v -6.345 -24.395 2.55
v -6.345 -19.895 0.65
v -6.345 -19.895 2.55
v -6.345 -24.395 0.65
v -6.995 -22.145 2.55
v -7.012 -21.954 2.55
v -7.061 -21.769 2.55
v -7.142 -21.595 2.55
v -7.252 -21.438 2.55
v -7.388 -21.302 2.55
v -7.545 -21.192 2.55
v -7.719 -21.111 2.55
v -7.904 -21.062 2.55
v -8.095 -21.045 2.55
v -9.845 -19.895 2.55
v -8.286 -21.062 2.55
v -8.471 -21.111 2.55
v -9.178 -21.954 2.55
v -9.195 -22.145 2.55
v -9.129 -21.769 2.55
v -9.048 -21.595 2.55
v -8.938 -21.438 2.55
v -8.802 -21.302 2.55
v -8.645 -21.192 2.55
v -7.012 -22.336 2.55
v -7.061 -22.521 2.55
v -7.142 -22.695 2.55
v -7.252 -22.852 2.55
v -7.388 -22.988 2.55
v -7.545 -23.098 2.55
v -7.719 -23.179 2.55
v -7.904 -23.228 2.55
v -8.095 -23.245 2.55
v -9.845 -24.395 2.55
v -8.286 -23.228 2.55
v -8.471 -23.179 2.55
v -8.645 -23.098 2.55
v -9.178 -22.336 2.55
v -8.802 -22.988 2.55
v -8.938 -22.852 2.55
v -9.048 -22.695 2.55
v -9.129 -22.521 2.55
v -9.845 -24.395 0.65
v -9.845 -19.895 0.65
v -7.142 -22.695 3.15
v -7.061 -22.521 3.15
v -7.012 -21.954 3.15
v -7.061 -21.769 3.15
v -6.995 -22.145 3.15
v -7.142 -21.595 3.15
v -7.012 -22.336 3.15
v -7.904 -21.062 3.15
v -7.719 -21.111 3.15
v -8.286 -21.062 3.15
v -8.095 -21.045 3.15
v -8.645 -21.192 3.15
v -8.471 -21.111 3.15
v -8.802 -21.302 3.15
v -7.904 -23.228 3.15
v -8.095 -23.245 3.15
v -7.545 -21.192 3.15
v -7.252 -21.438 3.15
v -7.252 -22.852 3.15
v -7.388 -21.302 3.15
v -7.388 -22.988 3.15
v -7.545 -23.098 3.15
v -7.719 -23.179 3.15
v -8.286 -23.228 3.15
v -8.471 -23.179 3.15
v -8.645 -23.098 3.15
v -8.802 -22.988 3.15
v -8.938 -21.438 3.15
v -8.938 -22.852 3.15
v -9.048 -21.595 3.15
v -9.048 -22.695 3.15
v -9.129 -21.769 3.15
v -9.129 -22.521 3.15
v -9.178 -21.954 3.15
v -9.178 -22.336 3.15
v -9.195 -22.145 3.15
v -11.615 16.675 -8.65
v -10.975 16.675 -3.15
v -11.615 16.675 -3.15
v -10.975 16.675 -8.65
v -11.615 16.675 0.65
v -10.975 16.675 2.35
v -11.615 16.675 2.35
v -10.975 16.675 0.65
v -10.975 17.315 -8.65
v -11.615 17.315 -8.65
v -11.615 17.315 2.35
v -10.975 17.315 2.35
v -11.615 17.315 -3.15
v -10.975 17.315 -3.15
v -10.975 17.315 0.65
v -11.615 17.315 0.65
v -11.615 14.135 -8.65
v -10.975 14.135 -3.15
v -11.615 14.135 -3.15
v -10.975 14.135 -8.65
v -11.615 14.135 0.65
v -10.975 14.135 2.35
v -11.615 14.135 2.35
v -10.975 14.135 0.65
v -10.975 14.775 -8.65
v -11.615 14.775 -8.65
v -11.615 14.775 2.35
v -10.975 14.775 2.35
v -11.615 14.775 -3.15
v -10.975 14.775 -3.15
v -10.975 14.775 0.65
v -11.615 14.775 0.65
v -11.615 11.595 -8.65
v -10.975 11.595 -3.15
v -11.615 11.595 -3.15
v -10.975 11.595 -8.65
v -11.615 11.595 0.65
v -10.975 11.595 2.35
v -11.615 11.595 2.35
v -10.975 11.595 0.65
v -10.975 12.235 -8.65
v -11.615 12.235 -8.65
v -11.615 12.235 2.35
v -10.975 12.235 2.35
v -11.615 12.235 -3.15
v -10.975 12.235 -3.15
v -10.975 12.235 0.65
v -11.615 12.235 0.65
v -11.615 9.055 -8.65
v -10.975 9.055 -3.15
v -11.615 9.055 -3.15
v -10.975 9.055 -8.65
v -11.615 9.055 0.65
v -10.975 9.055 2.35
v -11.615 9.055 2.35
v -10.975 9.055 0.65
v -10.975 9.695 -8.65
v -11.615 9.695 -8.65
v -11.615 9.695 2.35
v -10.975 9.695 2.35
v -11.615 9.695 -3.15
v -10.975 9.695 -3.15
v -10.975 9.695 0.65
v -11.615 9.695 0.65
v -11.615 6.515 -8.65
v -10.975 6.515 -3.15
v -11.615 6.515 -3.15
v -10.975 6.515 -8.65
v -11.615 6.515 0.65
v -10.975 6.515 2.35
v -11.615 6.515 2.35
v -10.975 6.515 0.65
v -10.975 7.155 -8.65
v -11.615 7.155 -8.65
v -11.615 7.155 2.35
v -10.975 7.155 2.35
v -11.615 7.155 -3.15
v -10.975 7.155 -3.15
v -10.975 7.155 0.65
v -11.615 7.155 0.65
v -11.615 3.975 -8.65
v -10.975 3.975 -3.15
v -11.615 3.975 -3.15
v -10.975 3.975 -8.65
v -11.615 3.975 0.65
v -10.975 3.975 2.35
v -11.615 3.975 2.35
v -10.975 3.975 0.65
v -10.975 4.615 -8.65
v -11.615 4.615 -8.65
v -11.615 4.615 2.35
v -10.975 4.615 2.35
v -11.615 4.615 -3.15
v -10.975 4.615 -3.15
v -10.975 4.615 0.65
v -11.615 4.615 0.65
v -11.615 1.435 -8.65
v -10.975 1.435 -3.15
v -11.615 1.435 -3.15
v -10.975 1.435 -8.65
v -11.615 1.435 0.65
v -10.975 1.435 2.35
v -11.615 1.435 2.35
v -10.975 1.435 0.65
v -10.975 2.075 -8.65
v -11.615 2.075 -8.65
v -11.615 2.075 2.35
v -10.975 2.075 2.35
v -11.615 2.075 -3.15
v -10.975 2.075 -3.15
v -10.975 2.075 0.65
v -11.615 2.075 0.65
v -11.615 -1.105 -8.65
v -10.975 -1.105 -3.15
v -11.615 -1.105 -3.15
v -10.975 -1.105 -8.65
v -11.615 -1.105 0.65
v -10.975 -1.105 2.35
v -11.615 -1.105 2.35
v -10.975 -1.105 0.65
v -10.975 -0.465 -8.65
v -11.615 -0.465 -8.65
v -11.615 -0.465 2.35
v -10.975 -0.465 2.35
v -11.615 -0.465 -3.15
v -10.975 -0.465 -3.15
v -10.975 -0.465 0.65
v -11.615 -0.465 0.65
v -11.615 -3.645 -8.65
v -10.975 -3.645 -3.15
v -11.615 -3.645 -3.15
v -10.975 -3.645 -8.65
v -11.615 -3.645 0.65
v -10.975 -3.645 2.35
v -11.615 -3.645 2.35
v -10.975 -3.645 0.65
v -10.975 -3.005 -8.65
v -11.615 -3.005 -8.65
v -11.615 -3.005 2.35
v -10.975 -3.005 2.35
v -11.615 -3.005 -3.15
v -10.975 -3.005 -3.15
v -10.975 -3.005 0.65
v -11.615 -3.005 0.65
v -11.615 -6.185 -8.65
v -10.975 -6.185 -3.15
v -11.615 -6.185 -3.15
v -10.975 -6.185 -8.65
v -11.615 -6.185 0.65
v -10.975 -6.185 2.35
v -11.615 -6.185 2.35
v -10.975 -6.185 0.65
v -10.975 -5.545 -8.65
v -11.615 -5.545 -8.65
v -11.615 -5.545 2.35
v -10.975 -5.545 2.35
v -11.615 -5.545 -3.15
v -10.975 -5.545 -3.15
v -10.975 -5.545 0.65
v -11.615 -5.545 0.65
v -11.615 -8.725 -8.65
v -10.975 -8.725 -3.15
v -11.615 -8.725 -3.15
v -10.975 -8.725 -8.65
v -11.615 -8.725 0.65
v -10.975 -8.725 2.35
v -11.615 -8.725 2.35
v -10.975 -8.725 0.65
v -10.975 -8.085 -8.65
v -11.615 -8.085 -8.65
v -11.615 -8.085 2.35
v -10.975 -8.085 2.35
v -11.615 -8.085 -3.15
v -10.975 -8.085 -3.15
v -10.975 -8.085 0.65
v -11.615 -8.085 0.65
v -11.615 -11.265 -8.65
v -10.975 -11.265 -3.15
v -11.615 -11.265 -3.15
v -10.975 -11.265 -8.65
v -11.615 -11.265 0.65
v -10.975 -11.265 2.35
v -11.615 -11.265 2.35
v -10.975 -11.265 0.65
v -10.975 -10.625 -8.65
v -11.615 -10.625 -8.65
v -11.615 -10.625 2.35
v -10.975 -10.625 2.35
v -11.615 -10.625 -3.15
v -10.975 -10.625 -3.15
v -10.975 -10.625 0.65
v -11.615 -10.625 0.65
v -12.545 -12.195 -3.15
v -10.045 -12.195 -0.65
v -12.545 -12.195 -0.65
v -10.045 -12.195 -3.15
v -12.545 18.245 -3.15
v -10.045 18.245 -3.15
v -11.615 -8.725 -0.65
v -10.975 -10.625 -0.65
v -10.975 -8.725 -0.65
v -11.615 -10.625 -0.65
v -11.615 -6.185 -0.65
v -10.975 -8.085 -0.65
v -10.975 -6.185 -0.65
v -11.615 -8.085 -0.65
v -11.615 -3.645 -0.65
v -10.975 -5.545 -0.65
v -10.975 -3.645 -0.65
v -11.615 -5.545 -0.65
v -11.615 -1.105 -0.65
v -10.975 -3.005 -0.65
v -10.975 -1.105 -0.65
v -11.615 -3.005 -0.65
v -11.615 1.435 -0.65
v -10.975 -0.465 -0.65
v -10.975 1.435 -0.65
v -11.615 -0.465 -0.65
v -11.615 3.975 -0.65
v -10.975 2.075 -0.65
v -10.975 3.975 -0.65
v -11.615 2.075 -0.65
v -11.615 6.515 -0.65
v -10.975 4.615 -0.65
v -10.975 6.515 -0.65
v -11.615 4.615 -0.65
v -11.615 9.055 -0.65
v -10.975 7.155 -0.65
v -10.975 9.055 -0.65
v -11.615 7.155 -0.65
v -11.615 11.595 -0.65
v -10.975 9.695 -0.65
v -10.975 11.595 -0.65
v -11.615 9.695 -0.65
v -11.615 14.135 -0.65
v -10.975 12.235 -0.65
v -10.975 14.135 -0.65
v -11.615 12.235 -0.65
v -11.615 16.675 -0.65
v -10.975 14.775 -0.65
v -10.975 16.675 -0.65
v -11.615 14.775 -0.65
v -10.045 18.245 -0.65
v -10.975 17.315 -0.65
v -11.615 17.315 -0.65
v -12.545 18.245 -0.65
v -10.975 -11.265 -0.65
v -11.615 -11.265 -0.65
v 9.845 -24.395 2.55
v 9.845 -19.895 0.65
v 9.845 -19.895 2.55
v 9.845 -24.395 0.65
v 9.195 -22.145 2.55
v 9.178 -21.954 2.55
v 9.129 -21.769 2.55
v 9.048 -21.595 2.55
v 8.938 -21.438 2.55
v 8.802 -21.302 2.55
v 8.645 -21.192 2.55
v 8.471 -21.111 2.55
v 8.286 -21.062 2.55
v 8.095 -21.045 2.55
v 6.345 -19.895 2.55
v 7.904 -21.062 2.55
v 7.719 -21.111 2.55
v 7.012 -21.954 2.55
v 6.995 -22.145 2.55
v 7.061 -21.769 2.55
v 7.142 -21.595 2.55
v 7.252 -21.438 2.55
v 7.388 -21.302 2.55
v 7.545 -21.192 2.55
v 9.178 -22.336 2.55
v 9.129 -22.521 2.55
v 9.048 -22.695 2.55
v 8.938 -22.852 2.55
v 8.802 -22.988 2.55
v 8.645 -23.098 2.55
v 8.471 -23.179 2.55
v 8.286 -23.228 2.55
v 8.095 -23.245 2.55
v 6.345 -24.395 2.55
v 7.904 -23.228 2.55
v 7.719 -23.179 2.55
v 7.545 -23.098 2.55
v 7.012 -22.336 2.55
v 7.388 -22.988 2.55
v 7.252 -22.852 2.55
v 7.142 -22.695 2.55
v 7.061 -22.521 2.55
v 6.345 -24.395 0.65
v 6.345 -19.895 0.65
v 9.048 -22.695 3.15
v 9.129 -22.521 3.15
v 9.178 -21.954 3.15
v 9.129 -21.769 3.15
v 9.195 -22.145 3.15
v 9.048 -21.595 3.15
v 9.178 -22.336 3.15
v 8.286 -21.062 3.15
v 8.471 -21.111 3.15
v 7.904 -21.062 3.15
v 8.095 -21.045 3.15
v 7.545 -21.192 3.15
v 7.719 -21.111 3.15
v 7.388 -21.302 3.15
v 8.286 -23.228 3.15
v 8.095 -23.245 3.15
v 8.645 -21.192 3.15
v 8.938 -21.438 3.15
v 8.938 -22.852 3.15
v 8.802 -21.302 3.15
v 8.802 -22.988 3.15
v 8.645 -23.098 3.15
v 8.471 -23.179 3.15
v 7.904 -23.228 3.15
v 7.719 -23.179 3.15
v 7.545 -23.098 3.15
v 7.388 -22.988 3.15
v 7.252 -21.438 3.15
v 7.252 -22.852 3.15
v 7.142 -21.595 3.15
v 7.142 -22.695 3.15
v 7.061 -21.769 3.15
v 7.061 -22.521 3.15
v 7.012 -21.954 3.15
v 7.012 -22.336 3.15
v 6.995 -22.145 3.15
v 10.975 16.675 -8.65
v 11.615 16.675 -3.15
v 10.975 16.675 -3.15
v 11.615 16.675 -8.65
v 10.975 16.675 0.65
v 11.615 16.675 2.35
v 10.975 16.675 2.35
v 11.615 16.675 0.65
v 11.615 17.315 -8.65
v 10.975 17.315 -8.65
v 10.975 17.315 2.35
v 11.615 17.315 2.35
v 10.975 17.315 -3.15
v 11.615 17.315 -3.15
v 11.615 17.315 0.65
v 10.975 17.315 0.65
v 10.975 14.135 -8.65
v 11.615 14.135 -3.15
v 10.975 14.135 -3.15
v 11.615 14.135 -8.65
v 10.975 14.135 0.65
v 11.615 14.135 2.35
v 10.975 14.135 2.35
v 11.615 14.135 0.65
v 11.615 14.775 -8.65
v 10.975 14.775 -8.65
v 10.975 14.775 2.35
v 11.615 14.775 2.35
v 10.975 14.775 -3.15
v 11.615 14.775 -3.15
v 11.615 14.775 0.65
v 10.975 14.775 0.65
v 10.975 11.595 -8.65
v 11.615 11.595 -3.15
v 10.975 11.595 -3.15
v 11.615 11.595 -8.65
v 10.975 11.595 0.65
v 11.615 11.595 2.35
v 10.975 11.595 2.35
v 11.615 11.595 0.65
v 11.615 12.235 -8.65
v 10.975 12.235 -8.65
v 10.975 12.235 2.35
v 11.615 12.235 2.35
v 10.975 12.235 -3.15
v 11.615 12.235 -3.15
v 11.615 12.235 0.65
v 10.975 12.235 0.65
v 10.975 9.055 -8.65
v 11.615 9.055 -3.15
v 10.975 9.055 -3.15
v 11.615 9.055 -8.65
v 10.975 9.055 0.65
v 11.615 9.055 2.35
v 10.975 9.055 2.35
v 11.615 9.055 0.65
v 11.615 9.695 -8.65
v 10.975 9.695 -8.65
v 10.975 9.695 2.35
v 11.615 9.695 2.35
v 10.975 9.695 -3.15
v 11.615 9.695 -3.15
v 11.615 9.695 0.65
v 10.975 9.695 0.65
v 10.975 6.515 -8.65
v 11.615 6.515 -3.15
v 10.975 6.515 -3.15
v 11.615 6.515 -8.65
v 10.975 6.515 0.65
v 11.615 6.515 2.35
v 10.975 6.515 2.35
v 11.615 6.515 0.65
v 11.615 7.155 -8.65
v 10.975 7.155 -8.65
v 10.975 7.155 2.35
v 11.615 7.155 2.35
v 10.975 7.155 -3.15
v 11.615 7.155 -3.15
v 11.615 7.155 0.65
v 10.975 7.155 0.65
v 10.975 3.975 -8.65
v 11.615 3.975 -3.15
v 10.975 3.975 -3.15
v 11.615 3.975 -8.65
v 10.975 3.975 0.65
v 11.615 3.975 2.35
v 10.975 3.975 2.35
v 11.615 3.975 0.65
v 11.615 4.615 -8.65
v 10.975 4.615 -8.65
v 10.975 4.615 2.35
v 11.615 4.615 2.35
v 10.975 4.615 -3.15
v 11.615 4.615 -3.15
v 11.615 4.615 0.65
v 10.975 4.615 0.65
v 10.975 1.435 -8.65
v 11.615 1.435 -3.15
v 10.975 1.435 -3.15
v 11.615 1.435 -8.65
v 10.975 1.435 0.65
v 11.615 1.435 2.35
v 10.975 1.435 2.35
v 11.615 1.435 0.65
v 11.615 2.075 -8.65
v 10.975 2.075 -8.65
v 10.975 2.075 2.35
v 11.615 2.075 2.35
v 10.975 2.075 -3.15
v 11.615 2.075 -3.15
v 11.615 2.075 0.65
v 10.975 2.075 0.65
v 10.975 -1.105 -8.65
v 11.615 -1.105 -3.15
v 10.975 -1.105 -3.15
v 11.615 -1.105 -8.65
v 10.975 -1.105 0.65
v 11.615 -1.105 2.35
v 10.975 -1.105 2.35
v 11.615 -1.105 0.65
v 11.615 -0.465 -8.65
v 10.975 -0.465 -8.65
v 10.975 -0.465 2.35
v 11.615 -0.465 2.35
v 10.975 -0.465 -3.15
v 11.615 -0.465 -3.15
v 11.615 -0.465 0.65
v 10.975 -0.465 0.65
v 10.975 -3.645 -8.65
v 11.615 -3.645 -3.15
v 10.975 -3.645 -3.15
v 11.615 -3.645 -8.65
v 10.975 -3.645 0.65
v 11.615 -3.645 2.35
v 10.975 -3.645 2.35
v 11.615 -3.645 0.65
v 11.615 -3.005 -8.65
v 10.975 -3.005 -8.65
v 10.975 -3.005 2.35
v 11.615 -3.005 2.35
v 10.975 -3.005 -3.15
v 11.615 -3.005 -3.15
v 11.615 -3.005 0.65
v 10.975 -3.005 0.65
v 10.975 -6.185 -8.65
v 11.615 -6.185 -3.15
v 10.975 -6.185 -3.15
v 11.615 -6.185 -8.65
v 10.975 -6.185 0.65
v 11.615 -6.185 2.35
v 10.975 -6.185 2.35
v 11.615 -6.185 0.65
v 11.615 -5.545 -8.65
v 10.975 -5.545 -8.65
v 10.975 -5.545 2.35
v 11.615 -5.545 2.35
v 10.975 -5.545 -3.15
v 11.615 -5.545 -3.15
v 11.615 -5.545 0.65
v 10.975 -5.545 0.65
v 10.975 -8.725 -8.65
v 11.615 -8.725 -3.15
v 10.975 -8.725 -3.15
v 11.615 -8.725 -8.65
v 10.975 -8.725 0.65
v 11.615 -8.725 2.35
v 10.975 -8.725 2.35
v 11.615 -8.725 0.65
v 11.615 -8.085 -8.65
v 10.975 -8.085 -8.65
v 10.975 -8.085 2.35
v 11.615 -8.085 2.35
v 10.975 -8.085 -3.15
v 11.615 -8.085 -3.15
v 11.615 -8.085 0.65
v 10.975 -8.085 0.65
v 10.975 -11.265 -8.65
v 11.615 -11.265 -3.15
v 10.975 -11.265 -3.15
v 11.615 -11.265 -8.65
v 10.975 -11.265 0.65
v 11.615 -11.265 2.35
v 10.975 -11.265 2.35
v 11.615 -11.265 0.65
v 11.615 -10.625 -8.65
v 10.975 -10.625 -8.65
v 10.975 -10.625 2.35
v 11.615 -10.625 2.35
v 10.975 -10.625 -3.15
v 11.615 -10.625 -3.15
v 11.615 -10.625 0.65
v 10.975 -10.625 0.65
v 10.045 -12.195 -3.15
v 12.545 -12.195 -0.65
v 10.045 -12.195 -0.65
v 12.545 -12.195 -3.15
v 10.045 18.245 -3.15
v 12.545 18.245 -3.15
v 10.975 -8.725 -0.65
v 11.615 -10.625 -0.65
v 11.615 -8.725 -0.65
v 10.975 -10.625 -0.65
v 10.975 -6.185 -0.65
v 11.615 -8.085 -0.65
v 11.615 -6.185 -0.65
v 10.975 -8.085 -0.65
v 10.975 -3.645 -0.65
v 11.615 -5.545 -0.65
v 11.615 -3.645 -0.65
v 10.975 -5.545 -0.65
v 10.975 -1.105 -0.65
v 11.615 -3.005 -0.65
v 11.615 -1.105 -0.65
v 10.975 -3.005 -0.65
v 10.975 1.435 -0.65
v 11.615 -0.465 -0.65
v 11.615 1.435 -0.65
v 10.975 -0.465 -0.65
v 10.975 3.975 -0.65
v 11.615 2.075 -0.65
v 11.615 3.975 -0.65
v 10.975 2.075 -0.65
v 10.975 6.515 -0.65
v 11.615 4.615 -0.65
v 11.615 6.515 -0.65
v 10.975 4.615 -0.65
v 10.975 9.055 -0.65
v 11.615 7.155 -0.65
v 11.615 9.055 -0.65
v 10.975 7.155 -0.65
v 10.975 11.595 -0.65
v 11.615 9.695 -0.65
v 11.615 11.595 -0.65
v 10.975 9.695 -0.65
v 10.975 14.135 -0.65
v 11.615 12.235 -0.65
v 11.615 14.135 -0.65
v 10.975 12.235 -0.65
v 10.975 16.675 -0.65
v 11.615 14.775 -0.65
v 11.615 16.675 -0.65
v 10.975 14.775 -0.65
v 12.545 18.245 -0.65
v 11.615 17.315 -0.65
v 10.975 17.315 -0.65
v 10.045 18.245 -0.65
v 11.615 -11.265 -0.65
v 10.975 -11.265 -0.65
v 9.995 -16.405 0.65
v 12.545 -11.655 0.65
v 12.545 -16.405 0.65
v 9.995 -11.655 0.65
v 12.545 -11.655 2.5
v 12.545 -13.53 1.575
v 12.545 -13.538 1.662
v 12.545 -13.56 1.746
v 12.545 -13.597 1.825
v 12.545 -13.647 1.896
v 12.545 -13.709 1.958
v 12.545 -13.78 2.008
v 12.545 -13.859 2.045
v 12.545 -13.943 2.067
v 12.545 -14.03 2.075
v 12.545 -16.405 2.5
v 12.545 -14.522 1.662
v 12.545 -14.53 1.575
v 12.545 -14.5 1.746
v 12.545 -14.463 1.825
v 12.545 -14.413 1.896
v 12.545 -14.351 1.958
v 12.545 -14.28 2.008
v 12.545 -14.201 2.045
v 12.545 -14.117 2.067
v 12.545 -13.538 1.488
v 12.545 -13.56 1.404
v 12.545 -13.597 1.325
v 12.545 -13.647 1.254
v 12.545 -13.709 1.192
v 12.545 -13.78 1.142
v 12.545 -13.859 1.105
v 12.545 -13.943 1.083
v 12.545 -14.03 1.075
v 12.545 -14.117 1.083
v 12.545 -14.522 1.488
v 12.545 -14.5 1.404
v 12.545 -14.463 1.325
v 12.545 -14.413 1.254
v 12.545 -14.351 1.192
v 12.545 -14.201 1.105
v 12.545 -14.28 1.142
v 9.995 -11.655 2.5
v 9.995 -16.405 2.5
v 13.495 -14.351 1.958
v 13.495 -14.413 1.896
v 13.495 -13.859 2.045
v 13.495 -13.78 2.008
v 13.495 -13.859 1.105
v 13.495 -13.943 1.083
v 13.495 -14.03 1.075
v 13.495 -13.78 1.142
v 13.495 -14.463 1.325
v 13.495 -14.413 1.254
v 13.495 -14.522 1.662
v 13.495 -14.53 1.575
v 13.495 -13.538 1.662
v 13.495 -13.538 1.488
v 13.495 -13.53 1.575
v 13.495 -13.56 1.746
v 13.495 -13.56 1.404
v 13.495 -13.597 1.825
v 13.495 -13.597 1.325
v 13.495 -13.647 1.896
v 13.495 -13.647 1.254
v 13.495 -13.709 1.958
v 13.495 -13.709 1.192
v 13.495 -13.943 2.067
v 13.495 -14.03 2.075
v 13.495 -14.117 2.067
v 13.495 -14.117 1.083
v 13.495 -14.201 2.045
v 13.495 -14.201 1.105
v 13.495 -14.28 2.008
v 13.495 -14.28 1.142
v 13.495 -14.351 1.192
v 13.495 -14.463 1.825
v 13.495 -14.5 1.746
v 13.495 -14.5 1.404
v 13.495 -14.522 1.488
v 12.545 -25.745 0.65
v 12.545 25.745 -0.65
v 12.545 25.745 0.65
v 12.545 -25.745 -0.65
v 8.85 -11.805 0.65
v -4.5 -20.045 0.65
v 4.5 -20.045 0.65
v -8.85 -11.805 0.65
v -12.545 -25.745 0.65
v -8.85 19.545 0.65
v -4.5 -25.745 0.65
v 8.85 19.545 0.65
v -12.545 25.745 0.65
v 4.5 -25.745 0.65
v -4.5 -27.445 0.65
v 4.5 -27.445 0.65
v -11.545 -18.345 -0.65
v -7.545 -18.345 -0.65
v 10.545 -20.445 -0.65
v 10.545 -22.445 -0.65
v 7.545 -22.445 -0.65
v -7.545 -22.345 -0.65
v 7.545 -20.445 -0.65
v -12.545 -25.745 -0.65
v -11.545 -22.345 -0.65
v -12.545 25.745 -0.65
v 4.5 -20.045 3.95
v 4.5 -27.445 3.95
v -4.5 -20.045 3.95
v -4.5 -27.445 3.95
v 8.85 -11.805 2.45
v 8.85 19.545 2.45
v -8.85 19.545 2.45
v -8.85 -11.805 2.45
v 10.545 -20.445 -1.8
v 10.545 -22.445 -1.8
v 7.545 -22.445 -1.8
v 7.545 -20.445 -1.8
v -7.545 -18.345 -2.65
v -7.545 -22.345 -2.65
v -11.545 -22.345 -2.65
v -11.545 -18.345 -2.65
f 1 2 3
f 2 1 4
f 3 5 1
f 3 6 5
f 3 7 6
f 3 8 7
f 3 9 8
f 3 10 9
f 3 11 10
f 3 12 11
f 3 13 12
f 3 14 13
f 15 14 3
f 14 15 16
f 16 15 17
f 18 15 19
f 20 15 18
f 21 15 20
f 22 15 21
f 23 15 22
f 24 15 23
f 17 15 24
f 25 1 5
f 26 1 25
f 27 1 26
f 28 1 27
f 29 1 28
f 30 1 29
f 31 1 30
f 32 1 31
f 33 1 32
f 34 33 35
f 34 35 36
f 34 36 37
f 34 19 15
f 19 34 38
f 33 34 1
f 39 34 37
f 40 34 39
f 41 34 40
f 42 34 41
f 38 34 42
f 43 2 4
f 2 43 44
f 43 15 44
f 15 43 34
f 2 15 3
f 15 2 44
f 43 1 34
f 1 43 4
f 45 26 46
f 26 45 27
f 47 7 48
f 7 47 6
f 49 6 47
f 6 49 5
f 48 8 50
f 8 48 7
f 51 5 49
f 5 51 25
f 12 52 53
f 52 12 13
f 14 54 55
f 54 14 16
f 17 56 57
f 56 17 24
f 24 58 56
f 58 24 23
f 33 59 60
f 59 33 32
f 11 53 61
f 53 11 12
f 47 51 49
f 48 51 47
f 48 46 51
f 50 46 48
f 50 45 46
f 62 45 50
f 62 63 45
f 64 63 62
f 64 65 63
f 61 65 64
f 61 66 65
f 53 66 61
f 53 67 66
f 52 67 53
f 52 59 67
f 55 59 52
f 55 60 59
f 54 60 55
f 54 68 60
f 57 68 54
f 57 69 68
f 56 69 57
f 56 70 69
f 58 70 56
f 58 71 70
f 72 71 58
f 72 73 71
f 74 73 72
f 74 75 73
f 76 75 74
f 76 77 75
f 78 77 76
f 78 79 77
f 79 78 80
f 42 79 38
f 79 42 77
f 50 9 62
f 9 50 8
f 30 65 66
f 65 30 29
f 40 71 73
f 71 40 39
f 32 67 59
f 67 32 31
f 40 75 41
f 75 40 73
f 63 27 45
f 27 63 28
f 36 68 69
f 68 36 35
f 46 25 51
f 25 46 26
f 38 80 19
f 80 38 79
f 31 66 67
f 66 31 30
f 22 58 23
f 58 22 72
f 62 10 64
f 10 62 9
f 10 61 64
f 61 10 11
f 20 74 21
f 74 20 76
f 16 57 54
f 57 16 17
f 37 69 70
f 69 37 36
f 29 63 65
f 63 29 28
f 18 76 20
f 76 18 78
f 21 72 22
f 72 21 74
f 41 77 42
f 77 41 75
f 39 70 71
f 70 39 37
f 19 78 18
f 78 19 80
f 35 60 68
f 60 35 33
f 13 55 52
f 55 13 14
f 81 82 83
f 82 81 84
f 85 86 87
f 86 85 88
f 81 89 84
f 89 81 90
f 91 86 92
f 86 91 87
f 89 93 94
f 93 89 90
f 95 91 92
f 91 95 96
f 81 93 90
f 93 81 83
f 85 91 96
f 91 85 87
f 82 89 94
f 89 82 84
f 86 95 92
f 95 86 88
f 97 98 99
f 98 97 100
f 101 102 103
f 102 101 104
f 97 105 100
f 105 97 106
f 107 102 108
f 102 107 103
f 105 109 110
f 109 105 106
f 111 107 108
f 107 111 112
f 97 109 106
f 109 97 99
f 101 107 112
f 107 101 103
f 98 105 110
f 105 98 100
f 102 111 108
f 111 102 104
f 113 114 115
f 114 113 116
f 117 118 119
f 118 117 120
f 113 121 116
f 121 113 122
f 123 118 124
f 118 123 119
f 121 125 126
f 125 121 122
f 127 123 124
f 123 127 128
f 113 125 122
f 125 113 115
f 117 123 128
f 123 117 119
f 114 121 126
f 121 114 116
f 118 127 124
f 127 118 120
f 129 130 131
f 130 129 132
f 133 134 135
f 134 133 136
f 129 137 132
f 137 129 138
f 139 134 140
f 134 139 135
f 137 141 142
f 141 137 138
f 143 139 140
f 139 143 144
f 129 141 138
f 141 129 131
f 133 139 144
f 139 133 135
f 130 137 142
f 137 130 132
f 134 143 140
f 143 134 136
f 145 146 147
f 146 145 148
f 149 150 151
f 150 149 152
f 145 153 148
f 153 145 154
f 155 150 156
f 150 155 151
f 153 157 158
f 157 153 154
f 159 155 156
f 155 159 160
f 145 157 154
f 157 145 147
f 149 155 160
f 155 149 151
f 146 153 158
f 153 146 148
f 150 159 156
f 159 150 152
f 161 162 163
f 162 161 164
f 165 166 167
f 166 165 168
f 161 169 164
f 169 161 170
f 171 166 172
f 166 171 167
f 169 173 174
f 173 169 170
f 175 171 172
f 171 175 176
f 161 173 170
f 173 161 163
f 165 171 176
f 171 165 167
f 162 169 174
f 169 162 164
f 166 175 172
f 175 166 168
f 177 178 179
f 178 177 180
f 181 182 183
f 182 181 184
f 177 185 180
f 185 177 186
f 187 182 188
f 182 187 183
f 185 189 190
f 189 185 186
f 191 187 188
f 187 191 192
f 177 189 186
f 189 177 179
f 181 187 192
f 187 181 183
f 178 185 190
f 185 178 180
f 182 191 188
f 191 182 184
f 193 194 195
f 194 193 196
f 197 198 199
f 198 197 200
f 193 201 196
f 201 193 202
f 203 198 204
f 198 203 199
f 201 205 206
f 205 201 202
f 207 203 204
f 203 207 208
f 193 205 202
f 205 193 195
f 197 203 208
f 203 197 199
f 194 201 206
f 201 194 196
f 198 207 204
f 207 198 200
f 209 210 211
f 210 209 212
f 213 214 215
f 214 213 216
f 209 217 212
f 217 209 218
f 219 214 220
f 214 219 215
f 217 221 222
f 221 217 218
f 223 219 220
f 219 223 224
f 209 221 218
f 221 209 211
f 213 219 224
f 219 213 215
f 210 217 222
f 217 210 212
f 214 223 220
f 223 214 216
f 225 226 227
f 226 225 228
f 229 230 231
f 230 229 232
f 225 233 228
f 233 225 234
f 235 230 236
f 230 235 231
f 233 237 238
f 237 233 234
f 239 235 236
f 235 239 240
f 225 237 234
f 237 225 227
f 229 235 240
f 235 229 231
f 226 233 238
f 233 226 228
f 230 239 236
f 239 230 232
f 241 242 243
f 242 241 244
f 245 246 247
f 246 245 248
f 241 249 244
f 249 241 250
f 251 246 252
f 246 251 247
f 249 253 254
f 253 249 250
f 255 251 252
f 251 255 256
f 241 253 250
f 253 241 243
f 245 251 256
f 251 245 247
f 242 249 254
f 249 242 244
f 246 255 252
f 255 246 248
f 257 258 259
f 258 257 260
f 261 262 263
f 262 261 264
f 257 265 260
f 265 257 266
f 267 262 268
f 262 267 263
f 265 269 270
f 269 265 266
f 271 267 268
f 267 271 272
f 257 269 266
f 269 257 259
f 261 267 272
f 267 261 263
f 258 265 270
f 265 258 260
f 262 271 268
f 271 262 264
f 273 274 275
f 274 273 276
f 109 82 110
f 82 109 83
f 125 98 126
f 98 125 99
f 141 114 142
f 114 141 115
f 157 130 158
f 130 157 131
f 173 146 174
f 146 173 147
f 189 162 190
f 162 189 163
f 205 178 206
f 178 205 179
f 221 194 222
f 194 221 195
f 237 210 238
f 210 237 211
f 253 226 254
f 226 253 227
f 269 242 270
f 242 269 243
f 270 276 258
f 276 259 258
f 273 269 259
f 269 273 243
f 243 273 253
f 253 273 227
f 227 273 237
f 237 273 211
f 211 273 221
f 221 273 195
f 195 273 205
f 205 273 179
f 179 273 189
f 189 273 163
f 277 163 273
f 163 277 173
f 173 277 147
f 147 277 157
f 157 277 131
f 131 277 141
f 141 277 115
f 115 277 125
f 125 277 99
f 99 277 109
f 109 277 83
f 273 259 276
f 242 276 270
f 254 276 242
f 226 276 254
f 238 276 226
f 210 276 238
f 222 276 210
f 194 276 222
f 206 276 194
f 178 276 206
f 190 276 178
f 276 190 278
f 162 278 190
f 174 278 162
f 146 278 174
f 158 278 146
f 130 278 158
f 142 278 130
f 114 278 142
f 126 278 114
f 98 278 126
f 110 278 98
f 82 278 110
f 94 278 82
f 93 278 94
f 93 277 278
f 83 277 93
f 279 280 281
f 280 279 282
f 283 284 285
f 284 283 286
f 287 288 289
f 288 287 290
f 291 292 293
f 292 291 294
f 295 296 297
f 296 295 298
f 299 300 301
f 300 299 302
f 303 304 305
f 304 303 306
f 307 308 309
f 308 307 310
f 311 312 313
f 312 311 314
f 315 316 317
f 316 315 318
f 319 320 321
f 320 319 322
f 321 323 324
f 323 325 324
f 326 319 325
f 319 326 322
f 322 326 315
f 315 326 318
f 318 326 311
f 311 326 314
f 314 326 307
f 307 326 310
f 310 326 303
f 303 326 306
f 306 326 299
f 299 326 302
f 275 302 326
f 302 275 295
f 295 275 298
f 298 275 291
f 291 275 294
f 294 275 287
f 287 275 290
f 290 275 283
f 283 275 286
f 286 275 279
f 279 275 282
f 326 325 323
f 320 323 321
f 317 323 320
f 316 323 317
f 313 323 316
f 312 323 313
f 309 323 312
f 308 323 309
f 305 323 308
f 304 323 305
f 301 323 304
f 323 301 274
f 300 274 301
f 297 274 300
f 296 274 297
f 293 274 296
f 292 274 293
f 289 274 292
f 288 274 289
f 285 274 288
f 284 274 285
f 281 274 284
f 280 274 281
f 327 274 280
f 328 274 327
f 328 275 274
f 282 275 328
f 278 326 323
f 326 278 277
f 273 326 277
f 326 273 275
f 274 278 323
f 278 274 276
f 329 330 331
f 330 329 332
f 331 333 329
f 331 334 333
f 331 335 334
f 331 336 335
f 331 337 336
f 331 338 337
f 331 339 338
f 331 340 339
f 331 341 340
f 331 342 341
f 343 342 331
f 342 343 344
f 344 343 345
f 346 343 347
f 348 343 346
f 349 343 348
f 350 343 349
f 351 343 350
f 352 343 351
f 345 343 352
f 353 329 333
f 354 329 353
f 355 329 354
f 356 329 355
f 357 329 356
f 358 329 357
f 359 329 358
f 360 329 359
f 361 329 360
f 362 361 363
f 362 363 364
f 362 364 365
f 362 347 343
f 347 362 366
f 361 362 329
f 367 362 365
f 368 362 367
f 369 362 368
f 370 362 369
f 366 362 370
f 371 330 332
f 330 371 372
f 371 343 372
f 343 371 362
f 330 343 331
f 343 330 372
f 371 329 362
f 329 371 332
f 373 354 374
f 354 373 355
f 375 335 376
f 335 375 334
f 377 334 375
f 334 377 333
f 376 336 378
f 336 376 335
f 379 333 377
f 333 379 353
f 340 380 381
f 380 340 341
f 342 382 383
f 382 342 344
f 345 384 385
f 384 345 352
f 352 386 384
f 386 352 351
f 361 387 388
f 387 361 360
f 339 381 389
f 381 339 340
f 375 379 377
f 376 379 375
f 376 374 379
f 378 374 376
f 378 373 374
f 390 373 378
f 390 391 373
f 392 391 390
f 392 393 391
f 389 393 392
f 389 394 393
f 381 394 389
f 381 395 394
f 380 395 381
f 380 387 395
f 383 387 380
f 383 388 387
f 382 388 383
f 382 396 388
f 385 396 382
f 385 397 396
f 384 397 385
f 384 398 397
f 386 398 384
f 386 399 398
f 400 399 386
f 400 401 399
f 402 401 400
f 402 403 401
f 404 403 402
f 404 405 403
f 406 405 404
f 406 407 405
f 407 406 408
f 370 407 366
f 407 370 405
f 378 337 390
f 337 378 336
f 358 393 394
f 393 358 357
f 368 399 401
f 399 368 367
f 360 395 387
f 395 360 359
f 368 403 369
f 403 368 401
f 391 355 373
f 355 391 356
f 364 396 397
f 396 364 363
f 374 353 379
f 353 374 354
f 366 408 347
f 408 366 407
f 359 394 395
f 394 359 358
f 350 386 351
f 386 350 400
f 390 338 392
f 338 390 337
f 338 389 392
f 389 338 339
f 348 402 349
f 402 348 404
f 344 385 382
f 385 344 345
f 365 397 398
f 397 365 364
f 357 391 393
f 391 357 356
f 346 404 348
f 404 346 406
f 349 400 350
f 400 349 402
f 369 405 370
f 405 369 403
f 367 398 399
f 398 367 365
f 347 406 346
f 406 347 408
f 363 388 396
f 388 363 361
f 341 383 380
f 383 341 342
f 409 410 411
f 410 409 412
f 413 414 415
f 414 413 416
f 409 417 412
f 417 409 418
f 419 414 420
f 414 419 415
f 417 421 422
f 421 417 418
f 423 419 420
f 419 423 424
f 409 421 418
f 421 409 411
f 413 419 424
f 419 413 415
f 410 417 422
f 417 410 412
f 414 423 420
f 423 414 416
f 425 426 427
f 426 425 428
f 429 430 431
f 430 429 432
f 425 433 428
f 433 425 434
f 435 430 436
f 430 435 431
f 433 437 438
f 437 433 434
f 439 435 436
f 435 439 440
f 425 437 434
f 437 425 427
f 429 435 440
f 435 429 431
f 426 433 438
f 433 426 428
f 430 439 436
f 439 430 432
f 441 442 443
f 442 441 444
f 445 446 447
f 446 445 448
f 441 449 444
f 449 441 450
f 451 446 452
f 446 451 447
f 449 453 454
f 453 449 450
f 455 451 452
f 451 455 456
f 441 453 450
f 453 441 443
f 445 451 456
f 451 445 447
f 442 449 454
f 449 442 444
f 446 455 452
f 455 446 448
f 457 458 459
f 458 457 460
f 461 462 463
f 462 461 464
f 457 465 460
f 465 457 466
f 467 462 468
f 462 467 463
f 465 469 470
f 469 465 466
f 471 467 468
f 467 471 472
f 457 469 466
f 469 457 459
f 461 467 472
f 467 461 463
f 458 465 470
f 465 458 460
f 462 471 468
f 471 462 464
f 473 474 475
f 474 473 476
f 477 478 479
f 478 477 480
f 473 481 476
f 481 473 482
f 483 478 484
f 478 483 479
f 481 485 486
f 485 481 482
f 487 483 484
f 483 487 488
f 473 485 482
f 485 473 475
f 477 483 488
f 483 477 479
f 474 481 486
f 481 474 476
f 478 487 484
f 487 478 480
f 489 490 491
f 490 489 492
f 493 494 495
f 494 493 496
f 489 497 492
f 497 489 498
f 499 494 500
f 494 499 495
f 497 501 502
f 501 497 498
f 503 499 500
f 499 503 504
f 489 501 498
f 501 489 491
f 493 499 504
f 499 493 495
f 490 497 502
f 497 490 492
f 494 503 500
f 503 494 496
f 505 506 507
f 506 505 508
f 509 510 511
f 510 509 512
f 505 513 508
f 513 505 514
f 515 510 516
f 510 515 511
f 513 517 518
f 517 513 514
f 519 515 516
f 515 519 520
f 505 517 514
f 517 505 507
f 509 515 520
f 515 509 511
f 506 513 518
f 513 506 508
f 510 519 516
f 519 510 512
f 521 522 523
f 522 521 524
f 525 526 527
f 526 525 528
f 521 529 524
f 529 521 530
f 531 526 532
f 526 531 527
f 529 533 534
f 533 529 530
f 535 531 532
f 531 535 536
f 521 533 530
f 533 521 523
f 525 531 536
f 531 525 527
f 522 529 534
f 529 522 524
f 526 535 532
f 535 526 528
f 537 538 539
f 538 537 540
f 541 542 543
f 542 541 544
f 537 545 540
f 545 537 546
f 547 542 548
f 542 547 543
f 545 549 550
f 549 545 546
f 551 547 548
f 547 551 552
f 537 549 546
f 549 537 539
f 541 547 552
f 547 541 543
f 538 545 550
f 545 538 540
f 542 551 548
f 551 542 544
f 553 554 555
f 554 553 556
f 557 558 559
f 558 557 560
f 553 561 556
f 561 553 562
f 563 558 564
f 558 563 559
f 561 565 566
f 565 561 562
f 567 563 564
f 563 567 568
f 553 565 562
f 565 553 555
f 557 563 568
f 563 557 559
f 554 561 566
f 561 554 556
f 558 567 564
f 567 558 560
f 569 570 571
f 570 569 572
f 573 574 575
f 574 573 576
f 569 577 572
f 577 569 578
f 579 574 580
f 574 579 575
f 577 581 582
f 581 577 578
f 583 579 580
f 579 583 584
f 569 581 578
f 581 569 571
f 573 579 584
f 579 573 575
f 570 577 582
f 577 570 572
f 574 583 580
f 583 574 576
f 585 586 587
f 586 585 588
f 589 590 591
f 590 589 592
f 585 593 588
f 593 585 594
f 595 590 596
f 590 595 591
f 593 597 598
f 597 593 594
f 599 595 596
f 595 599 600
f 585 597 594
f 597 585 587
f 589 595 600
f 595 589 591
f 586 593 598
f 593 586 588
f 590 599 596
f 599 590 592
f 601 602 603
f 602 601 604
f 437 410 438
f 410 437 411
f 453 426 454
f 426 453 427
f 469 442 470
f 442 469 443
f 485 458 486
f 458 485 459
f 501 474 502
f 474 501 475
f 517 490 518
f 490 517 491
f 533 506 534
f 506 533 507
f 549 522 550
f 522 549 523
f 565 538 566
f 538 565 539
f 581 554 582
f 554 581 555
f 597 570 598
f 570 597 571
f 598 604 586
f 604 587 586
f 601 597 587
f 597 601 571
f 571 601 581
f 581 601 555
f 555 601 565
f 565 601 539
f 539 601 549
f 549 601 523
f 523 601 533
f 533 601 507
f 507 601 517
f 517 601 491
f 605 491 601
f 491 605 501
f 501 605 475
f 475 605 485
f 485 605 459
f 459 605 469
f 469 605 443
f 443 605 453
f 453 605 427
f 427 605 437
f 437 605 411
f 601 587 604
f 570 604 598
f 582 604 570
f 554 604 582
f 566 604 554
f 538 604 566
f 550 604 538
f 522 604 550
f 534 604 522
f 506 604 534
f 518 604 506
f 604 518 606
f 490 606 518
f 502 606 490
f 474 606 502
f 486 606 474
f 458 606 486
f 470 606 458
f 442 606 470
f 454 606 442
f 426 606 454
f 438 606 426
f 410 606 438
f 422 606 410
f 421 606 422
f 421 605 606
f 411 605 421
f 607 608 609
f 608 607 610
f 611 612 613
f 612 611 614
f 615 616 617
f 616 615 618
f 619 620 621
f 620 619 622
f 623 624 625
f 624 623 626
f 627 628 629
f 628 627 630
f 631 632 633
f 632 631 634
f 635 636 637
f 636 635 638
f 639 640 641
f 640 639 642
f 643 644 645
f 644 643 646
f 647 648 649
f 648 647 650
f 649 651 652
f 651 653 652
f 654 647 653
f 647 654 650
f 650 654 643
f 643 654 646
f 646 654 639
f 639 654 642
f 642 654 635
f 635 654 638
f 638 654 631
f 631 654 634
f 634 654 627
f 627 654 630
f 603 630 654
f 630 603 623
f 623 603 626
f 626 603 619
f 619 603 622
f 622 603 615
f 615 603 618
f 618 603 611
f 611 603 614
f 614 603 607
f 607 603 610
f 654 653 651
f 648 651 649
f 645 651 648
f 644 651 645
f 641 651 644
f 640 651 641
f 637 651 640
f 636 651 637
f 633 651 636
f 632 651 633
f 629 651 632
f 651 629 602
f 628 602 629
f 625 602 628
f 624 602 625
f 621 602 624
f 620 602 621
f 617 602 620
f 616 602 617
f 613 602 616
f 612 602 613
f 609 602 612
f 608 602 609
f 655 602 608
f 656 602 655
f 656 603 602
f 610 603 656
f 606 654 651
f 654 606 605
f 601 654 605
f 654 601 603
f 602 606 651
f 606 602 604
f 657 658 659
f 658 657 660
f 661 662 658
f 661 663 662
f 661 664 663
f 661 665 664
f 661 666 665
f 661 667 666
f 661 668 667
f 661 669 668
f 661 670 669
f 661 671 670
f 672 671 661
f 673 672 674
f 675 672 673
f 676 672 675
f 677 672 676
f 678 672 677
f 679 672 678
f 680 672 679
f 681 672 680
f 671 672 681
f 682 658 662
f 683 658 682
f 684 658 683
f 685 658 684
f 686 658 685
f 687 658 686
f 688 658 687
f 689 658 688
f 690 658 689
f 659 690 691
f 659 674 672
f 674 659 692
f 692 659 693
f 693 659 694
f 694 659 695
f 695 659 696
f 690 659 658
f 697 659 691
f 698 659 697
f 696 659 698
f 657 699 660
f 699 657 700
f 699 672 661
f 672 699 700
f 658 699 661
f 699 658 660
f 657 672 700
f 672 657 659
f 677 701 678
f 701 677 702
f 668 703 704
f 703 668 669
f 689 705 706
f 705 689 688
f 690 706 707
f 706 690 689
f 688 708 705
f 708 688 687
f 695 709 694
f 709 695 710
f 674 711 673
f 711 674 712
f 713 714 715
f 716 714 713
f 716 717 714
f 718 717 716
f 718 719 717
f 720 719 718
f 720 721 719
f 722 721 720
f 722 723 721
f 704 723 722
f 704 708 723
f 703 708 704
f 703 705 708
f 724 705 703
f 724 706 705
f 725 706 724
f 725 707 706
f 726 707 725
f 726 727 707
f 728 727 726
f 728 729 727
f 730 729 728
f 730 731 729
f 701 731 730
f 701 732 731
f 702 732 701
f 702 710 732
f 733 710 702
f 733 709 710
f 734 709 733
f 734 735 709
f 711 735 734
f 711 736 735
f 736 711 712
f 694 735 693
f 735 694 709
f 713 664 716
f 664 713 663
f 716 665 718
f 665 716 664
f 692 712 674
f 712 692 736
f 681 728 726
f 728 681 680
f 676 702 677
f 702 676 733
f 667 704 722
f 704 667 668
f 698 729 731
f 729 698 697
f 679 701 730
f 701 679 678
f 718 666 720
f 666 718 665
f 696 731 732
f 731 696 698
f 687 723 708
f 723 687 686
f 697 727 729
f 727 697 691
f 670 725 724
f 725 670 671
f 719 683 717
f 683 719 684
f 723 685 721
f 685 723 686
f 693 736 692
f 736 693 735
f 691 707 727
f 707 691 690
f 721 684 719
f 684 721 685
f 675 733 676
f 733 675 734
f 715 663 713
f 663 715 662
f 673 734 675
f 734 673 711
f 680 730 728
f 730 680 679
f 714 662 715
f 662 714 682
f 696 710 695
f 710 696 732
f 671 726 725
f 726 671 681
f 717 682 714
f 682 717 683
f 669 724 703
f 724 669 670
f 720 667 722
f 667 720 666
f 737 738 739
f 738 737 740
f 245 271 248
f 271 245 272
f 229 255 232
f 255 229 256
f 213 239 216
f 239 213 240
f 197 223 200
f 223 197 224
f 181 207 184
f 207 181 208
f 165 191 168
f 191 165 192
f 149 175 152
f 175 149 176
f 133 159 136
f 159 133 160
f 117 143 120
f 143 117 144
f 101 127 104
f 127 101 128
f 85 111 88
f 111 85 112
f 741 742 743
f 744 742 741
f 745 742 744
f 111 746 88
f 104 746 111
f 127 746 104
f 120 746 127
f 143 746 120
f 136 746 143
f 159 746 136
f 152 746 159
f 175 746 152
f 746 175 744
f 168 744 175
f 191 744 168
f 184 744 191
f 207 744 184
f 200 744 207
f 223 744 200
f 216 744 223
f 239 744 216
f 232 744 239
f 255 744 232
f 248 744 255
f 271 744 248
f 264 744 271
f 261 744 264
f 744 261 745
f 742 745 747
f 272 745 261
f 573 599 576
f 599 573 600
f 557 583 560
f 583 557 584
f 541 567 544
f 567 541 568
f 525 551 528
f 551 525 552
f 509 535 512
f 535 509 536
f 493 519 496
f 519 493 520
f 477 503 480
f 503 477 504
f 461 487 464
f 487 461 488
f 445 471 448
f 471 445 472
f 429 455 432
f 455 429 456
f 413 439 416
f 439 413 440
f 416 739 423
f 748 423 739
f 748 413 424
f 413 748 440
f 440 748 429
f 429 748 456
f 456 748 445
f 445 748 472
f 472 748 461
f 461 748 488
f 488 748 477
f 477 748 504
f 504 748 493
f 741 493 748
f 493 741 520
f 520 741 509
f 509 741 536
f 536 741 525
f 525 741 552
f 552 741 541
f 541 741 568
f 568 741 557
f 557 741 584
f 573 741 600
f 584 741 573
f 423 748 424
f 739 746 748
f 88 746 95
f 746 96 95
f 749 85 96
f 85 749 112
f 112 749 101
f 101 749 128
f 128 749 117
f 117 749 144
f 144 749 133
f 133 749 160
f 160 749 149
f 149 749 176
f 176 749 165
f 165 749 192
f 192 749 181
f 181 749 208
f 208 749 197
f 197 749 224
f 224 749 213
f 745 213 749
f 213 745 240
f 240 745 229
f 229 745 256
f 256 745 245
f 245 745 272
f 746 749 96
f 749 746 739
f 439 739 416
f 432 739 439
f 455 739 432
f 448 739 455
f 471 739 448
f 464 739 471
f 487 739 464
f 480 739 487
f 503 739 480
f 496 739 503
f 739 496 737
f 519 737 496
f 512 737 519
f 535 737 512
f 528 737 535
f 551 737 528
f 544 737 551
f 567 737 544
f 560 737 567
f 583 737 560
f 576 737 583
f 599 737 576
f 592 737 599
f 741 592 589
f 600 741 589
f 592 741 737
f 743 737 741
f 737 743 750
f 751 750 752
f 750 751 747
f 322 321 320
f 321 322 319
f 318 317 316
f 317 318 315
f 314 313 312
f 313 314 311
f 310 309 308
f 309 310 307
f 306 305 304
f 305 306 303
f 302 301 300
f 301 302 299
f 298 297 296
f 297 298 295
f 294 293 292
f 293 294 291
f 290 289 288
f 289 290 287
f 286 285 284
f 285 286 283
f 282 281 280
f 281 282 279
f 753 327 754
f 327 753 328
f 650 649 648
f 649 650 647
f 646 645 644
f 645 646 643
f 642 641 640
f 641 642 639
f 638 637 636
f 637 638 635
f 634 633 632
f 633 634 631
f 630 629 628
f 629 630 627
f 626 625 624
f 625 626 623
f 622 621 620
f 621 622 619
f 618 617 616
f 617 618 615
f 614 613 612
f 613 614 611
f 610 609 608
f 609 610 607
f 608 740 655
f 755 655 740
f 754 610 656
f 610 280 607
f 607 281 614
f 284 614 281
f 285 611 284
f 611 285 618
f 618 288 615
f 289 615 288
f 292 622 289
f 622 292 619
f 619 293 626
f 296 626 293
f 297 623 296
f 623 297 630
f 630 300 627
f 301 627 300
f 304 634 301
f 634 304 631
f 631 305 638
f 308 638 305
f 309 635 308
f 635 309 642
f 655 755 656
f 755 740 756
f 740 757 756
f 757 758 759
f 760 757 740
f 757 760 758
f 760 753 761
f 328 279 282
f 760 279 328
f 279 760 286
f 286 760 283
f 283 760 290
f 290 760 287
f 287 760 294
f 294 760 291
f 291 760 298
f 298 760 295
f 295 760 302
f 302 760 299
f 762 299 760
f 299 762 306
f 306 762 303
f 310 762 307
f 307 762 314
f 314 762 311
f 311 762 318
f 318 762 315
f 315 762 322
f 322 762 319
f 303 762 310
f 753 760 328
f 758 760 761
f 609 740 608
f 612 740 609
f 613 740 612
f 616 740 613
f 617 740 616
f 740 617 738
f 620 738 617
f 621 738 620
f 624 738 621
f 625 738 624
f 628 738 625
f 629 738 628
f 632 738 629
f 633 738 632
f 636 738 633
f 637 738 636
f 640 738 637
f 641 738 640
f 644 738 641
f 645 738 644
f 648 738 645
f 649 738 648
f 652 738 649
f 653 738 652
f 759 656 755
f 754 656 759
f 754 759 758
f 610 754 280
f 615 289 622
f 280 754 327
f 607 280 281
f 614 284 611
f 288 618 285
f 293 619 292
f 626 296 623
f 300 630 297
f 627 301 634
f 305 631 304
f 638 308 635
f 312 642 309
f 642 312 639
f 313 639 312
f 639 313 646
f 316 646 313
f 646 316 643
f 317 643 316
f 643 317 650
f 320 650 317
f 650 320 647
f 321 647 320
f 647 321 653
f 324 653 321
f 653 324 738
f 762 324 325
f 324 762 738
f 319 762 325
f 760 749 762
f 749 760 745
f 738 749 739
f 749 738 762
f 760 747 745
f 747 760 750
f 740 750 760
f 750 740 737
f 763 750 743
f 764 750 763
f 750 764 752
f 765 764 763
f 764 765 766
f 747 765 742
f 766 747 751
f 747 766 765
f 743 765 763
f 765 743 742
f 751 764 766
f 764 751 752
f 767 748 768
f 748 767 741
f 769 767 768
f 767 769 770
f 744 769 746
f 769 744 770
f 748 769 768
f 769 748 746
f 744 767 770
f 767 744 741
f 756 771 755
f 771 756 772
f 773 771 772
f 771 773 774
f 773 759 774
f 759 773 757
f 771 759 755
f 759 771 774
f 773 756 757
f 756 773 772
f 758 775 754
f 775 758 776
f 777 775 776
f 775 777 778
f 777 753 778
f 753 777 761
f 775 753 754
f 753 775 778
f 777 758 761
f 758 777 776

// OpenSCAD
// file: components.scad
module button(dim=[3.5, 4.5, 1.9], knob_z=2.5, knob_d=2.2, $fn=36) {
    color("silver") {
        cube(dim, center=true);
    }
    color("cornsilk") {
        translate([0, 0, -dim[2]/2])
        cylinder(h=knob_z, d=knob_d);
    }
}

function dupont_pin_length(n=2, pitch=2.54, spacer_w=2.5) = (n - 1) * pitch + spacer_w;

module dupont_pin(n=2, pitch=2.54, size=.64, pin_h=11, spacer_h=2.5, spacer_w=2.5) {
    span = (n - 1) * pitch;
    spacer_l = dupont_pin_length(n, pitch, spacer_w);

    color("slategrey") {
        translate([0, 0, spacer_h / 2])
        cube([spacer_l, spacer_w, spacer_h], center=true);
    }

    color("gold") {
        for (i = [0 : n - 1]) {
            translate([i * pitch - span / 2, 0, pin_h / 2 -3])
            cube([size, size, pin_h], center=true);
        }
    }
}

module chip(dim) {
    color("darkgoldenrod") {
        cube(dim, center = true);
    }
}
// main file
use <components.scad>
board_x = 25.09;
board_y = 51.49;
board_z = 1.3;
board_dim = [board_x, board_y, board_z];


usbc_x = 9;
usbc_y = 7.4;
usbc_z = 3.3;
port_loc_z = 1.7;
usbc_loc = [0, -(board_y/2 - usbc_y/2 + port_loc_z), board_z/2 + usbc_z/2];

screen_x = 17.7;
screen_y = 31.35;
screen_z = 3.1 - board_z;
// distance from top
screen_loc_y = 6.2;
screen_loc = [0, board_y/2 - screen_y/2 - screen_loc_y, board_z/2 + screen_z/2];

button_x = 3.5;
button_y = 4.5;
button_z = 1.9;
button_knob_z = 2.5;
button_knob_d = 2.2;


// button_loc_x = board_x/2 - 2.59;
// button_loc_y = board_y/2 - 1.35;
button_loc_x = board_x/2 - button_x/2 - 2.7;
button_loc_y = -board_y/2 + button_y/2 + 1.35;
button_loc_z = board_z/2 + button_z/2;
button_loc = [button_loc_x, button_loc_y, button_loc_z];

n_pins = 12;
pin_block_len = dupont_pin_length(n=n_pins);
pin_loc_x = board_x/2 - 2.5/2;
pin_loc_y = board_y/2 - pin_block_len/2 - 7.5;
pin_loc_z = -board_z/2;

pin_loc = [pin_loc_x, pin_loc_y, pin_loc_z];


reset_button_y = 4.75;
reset_button_x = 1.85;
reset_button_z = 2.55;
reset_knob_z = 3.5; 
reset_knob_d = 1;
reset_loc_x = board_x/2 - reset_button_z/2;
reset_loc_y = board_y/2 - reset_button_y/2 - 37.4;
reset_loc_z = board_z/2 + reset_button_x/2;
reset_loc = [reset_loc_x, reset_loc_y, reset_loc_z];

r_chip_z = 2.45 - board_z;
r_chip_x = 3;
r_chip_y = 2;
r_chip_loc_x = board_x/2 - r_chip_x/2 - 2; 
r_chip_loc_y = -board_y/2 + r_chip_y/2 + 3.3;
r_chip_loc_z = -board_z/2 - r_chip_z/2;
r_chip_loc = [r_chip_loc_x, r_chip_loc_y, r_chip_loc_z];

l_chip_z = 2;
l_chip_x = 4;
l_chip_y = 4;
l_chip_loc_x = -board_x/2 + l_chip_x/2 +1;
l_chip_loc_y = -board_y/2 + l_chip_y/2 + 3.4;
l_chip_loc_z = -board_z/2 - l_chip_z/2;
l_chip_loc = [l_chip_loc_x, l_chip_loc_y, l_chip_loc_z];

module board() {
    color("darkslategray") {
        difference() {
            cube(board_dim, center=true);
        }
    }
    //usb c port
    color("silver") {
        translate(usbc_loc)
        cube([usbc_x, usbc_y, usbc_z], center=true);
    }
    //screen
    color("cadetblue") {
        translate(screen_loc) {
            cube([screen_x, screen_y, screen_z], center=true);
        }
    }
    for (i = [-1, 1]) {
        translate([button_loc[0] * i, button_loc[1], button_loc[2]]) {
            button();
        }
        translate([pin_loc[0] * i, pin_loc[1], pin_loc[2]]) {
            rotate([0, 180, 90]) {
                dupont_pin(n_pins);
            }
        }
    }
    translate(reset_loc) {
        rotate([0, 90, 0]) {
            button([reset_button_x, reset_button_y, reset_button_z], knob_z=reset_knob_z, knob_d=reset_knob_d);
        }

    }
    translate(r_chip_loc) {
        chip([r_chip_x, r_chip_y, r_chip_z]);
    }

    translate(l_chip_loc) {
        chip([l_chip_x, l_chip_y, l_chip_z]);
    }
}

board();
